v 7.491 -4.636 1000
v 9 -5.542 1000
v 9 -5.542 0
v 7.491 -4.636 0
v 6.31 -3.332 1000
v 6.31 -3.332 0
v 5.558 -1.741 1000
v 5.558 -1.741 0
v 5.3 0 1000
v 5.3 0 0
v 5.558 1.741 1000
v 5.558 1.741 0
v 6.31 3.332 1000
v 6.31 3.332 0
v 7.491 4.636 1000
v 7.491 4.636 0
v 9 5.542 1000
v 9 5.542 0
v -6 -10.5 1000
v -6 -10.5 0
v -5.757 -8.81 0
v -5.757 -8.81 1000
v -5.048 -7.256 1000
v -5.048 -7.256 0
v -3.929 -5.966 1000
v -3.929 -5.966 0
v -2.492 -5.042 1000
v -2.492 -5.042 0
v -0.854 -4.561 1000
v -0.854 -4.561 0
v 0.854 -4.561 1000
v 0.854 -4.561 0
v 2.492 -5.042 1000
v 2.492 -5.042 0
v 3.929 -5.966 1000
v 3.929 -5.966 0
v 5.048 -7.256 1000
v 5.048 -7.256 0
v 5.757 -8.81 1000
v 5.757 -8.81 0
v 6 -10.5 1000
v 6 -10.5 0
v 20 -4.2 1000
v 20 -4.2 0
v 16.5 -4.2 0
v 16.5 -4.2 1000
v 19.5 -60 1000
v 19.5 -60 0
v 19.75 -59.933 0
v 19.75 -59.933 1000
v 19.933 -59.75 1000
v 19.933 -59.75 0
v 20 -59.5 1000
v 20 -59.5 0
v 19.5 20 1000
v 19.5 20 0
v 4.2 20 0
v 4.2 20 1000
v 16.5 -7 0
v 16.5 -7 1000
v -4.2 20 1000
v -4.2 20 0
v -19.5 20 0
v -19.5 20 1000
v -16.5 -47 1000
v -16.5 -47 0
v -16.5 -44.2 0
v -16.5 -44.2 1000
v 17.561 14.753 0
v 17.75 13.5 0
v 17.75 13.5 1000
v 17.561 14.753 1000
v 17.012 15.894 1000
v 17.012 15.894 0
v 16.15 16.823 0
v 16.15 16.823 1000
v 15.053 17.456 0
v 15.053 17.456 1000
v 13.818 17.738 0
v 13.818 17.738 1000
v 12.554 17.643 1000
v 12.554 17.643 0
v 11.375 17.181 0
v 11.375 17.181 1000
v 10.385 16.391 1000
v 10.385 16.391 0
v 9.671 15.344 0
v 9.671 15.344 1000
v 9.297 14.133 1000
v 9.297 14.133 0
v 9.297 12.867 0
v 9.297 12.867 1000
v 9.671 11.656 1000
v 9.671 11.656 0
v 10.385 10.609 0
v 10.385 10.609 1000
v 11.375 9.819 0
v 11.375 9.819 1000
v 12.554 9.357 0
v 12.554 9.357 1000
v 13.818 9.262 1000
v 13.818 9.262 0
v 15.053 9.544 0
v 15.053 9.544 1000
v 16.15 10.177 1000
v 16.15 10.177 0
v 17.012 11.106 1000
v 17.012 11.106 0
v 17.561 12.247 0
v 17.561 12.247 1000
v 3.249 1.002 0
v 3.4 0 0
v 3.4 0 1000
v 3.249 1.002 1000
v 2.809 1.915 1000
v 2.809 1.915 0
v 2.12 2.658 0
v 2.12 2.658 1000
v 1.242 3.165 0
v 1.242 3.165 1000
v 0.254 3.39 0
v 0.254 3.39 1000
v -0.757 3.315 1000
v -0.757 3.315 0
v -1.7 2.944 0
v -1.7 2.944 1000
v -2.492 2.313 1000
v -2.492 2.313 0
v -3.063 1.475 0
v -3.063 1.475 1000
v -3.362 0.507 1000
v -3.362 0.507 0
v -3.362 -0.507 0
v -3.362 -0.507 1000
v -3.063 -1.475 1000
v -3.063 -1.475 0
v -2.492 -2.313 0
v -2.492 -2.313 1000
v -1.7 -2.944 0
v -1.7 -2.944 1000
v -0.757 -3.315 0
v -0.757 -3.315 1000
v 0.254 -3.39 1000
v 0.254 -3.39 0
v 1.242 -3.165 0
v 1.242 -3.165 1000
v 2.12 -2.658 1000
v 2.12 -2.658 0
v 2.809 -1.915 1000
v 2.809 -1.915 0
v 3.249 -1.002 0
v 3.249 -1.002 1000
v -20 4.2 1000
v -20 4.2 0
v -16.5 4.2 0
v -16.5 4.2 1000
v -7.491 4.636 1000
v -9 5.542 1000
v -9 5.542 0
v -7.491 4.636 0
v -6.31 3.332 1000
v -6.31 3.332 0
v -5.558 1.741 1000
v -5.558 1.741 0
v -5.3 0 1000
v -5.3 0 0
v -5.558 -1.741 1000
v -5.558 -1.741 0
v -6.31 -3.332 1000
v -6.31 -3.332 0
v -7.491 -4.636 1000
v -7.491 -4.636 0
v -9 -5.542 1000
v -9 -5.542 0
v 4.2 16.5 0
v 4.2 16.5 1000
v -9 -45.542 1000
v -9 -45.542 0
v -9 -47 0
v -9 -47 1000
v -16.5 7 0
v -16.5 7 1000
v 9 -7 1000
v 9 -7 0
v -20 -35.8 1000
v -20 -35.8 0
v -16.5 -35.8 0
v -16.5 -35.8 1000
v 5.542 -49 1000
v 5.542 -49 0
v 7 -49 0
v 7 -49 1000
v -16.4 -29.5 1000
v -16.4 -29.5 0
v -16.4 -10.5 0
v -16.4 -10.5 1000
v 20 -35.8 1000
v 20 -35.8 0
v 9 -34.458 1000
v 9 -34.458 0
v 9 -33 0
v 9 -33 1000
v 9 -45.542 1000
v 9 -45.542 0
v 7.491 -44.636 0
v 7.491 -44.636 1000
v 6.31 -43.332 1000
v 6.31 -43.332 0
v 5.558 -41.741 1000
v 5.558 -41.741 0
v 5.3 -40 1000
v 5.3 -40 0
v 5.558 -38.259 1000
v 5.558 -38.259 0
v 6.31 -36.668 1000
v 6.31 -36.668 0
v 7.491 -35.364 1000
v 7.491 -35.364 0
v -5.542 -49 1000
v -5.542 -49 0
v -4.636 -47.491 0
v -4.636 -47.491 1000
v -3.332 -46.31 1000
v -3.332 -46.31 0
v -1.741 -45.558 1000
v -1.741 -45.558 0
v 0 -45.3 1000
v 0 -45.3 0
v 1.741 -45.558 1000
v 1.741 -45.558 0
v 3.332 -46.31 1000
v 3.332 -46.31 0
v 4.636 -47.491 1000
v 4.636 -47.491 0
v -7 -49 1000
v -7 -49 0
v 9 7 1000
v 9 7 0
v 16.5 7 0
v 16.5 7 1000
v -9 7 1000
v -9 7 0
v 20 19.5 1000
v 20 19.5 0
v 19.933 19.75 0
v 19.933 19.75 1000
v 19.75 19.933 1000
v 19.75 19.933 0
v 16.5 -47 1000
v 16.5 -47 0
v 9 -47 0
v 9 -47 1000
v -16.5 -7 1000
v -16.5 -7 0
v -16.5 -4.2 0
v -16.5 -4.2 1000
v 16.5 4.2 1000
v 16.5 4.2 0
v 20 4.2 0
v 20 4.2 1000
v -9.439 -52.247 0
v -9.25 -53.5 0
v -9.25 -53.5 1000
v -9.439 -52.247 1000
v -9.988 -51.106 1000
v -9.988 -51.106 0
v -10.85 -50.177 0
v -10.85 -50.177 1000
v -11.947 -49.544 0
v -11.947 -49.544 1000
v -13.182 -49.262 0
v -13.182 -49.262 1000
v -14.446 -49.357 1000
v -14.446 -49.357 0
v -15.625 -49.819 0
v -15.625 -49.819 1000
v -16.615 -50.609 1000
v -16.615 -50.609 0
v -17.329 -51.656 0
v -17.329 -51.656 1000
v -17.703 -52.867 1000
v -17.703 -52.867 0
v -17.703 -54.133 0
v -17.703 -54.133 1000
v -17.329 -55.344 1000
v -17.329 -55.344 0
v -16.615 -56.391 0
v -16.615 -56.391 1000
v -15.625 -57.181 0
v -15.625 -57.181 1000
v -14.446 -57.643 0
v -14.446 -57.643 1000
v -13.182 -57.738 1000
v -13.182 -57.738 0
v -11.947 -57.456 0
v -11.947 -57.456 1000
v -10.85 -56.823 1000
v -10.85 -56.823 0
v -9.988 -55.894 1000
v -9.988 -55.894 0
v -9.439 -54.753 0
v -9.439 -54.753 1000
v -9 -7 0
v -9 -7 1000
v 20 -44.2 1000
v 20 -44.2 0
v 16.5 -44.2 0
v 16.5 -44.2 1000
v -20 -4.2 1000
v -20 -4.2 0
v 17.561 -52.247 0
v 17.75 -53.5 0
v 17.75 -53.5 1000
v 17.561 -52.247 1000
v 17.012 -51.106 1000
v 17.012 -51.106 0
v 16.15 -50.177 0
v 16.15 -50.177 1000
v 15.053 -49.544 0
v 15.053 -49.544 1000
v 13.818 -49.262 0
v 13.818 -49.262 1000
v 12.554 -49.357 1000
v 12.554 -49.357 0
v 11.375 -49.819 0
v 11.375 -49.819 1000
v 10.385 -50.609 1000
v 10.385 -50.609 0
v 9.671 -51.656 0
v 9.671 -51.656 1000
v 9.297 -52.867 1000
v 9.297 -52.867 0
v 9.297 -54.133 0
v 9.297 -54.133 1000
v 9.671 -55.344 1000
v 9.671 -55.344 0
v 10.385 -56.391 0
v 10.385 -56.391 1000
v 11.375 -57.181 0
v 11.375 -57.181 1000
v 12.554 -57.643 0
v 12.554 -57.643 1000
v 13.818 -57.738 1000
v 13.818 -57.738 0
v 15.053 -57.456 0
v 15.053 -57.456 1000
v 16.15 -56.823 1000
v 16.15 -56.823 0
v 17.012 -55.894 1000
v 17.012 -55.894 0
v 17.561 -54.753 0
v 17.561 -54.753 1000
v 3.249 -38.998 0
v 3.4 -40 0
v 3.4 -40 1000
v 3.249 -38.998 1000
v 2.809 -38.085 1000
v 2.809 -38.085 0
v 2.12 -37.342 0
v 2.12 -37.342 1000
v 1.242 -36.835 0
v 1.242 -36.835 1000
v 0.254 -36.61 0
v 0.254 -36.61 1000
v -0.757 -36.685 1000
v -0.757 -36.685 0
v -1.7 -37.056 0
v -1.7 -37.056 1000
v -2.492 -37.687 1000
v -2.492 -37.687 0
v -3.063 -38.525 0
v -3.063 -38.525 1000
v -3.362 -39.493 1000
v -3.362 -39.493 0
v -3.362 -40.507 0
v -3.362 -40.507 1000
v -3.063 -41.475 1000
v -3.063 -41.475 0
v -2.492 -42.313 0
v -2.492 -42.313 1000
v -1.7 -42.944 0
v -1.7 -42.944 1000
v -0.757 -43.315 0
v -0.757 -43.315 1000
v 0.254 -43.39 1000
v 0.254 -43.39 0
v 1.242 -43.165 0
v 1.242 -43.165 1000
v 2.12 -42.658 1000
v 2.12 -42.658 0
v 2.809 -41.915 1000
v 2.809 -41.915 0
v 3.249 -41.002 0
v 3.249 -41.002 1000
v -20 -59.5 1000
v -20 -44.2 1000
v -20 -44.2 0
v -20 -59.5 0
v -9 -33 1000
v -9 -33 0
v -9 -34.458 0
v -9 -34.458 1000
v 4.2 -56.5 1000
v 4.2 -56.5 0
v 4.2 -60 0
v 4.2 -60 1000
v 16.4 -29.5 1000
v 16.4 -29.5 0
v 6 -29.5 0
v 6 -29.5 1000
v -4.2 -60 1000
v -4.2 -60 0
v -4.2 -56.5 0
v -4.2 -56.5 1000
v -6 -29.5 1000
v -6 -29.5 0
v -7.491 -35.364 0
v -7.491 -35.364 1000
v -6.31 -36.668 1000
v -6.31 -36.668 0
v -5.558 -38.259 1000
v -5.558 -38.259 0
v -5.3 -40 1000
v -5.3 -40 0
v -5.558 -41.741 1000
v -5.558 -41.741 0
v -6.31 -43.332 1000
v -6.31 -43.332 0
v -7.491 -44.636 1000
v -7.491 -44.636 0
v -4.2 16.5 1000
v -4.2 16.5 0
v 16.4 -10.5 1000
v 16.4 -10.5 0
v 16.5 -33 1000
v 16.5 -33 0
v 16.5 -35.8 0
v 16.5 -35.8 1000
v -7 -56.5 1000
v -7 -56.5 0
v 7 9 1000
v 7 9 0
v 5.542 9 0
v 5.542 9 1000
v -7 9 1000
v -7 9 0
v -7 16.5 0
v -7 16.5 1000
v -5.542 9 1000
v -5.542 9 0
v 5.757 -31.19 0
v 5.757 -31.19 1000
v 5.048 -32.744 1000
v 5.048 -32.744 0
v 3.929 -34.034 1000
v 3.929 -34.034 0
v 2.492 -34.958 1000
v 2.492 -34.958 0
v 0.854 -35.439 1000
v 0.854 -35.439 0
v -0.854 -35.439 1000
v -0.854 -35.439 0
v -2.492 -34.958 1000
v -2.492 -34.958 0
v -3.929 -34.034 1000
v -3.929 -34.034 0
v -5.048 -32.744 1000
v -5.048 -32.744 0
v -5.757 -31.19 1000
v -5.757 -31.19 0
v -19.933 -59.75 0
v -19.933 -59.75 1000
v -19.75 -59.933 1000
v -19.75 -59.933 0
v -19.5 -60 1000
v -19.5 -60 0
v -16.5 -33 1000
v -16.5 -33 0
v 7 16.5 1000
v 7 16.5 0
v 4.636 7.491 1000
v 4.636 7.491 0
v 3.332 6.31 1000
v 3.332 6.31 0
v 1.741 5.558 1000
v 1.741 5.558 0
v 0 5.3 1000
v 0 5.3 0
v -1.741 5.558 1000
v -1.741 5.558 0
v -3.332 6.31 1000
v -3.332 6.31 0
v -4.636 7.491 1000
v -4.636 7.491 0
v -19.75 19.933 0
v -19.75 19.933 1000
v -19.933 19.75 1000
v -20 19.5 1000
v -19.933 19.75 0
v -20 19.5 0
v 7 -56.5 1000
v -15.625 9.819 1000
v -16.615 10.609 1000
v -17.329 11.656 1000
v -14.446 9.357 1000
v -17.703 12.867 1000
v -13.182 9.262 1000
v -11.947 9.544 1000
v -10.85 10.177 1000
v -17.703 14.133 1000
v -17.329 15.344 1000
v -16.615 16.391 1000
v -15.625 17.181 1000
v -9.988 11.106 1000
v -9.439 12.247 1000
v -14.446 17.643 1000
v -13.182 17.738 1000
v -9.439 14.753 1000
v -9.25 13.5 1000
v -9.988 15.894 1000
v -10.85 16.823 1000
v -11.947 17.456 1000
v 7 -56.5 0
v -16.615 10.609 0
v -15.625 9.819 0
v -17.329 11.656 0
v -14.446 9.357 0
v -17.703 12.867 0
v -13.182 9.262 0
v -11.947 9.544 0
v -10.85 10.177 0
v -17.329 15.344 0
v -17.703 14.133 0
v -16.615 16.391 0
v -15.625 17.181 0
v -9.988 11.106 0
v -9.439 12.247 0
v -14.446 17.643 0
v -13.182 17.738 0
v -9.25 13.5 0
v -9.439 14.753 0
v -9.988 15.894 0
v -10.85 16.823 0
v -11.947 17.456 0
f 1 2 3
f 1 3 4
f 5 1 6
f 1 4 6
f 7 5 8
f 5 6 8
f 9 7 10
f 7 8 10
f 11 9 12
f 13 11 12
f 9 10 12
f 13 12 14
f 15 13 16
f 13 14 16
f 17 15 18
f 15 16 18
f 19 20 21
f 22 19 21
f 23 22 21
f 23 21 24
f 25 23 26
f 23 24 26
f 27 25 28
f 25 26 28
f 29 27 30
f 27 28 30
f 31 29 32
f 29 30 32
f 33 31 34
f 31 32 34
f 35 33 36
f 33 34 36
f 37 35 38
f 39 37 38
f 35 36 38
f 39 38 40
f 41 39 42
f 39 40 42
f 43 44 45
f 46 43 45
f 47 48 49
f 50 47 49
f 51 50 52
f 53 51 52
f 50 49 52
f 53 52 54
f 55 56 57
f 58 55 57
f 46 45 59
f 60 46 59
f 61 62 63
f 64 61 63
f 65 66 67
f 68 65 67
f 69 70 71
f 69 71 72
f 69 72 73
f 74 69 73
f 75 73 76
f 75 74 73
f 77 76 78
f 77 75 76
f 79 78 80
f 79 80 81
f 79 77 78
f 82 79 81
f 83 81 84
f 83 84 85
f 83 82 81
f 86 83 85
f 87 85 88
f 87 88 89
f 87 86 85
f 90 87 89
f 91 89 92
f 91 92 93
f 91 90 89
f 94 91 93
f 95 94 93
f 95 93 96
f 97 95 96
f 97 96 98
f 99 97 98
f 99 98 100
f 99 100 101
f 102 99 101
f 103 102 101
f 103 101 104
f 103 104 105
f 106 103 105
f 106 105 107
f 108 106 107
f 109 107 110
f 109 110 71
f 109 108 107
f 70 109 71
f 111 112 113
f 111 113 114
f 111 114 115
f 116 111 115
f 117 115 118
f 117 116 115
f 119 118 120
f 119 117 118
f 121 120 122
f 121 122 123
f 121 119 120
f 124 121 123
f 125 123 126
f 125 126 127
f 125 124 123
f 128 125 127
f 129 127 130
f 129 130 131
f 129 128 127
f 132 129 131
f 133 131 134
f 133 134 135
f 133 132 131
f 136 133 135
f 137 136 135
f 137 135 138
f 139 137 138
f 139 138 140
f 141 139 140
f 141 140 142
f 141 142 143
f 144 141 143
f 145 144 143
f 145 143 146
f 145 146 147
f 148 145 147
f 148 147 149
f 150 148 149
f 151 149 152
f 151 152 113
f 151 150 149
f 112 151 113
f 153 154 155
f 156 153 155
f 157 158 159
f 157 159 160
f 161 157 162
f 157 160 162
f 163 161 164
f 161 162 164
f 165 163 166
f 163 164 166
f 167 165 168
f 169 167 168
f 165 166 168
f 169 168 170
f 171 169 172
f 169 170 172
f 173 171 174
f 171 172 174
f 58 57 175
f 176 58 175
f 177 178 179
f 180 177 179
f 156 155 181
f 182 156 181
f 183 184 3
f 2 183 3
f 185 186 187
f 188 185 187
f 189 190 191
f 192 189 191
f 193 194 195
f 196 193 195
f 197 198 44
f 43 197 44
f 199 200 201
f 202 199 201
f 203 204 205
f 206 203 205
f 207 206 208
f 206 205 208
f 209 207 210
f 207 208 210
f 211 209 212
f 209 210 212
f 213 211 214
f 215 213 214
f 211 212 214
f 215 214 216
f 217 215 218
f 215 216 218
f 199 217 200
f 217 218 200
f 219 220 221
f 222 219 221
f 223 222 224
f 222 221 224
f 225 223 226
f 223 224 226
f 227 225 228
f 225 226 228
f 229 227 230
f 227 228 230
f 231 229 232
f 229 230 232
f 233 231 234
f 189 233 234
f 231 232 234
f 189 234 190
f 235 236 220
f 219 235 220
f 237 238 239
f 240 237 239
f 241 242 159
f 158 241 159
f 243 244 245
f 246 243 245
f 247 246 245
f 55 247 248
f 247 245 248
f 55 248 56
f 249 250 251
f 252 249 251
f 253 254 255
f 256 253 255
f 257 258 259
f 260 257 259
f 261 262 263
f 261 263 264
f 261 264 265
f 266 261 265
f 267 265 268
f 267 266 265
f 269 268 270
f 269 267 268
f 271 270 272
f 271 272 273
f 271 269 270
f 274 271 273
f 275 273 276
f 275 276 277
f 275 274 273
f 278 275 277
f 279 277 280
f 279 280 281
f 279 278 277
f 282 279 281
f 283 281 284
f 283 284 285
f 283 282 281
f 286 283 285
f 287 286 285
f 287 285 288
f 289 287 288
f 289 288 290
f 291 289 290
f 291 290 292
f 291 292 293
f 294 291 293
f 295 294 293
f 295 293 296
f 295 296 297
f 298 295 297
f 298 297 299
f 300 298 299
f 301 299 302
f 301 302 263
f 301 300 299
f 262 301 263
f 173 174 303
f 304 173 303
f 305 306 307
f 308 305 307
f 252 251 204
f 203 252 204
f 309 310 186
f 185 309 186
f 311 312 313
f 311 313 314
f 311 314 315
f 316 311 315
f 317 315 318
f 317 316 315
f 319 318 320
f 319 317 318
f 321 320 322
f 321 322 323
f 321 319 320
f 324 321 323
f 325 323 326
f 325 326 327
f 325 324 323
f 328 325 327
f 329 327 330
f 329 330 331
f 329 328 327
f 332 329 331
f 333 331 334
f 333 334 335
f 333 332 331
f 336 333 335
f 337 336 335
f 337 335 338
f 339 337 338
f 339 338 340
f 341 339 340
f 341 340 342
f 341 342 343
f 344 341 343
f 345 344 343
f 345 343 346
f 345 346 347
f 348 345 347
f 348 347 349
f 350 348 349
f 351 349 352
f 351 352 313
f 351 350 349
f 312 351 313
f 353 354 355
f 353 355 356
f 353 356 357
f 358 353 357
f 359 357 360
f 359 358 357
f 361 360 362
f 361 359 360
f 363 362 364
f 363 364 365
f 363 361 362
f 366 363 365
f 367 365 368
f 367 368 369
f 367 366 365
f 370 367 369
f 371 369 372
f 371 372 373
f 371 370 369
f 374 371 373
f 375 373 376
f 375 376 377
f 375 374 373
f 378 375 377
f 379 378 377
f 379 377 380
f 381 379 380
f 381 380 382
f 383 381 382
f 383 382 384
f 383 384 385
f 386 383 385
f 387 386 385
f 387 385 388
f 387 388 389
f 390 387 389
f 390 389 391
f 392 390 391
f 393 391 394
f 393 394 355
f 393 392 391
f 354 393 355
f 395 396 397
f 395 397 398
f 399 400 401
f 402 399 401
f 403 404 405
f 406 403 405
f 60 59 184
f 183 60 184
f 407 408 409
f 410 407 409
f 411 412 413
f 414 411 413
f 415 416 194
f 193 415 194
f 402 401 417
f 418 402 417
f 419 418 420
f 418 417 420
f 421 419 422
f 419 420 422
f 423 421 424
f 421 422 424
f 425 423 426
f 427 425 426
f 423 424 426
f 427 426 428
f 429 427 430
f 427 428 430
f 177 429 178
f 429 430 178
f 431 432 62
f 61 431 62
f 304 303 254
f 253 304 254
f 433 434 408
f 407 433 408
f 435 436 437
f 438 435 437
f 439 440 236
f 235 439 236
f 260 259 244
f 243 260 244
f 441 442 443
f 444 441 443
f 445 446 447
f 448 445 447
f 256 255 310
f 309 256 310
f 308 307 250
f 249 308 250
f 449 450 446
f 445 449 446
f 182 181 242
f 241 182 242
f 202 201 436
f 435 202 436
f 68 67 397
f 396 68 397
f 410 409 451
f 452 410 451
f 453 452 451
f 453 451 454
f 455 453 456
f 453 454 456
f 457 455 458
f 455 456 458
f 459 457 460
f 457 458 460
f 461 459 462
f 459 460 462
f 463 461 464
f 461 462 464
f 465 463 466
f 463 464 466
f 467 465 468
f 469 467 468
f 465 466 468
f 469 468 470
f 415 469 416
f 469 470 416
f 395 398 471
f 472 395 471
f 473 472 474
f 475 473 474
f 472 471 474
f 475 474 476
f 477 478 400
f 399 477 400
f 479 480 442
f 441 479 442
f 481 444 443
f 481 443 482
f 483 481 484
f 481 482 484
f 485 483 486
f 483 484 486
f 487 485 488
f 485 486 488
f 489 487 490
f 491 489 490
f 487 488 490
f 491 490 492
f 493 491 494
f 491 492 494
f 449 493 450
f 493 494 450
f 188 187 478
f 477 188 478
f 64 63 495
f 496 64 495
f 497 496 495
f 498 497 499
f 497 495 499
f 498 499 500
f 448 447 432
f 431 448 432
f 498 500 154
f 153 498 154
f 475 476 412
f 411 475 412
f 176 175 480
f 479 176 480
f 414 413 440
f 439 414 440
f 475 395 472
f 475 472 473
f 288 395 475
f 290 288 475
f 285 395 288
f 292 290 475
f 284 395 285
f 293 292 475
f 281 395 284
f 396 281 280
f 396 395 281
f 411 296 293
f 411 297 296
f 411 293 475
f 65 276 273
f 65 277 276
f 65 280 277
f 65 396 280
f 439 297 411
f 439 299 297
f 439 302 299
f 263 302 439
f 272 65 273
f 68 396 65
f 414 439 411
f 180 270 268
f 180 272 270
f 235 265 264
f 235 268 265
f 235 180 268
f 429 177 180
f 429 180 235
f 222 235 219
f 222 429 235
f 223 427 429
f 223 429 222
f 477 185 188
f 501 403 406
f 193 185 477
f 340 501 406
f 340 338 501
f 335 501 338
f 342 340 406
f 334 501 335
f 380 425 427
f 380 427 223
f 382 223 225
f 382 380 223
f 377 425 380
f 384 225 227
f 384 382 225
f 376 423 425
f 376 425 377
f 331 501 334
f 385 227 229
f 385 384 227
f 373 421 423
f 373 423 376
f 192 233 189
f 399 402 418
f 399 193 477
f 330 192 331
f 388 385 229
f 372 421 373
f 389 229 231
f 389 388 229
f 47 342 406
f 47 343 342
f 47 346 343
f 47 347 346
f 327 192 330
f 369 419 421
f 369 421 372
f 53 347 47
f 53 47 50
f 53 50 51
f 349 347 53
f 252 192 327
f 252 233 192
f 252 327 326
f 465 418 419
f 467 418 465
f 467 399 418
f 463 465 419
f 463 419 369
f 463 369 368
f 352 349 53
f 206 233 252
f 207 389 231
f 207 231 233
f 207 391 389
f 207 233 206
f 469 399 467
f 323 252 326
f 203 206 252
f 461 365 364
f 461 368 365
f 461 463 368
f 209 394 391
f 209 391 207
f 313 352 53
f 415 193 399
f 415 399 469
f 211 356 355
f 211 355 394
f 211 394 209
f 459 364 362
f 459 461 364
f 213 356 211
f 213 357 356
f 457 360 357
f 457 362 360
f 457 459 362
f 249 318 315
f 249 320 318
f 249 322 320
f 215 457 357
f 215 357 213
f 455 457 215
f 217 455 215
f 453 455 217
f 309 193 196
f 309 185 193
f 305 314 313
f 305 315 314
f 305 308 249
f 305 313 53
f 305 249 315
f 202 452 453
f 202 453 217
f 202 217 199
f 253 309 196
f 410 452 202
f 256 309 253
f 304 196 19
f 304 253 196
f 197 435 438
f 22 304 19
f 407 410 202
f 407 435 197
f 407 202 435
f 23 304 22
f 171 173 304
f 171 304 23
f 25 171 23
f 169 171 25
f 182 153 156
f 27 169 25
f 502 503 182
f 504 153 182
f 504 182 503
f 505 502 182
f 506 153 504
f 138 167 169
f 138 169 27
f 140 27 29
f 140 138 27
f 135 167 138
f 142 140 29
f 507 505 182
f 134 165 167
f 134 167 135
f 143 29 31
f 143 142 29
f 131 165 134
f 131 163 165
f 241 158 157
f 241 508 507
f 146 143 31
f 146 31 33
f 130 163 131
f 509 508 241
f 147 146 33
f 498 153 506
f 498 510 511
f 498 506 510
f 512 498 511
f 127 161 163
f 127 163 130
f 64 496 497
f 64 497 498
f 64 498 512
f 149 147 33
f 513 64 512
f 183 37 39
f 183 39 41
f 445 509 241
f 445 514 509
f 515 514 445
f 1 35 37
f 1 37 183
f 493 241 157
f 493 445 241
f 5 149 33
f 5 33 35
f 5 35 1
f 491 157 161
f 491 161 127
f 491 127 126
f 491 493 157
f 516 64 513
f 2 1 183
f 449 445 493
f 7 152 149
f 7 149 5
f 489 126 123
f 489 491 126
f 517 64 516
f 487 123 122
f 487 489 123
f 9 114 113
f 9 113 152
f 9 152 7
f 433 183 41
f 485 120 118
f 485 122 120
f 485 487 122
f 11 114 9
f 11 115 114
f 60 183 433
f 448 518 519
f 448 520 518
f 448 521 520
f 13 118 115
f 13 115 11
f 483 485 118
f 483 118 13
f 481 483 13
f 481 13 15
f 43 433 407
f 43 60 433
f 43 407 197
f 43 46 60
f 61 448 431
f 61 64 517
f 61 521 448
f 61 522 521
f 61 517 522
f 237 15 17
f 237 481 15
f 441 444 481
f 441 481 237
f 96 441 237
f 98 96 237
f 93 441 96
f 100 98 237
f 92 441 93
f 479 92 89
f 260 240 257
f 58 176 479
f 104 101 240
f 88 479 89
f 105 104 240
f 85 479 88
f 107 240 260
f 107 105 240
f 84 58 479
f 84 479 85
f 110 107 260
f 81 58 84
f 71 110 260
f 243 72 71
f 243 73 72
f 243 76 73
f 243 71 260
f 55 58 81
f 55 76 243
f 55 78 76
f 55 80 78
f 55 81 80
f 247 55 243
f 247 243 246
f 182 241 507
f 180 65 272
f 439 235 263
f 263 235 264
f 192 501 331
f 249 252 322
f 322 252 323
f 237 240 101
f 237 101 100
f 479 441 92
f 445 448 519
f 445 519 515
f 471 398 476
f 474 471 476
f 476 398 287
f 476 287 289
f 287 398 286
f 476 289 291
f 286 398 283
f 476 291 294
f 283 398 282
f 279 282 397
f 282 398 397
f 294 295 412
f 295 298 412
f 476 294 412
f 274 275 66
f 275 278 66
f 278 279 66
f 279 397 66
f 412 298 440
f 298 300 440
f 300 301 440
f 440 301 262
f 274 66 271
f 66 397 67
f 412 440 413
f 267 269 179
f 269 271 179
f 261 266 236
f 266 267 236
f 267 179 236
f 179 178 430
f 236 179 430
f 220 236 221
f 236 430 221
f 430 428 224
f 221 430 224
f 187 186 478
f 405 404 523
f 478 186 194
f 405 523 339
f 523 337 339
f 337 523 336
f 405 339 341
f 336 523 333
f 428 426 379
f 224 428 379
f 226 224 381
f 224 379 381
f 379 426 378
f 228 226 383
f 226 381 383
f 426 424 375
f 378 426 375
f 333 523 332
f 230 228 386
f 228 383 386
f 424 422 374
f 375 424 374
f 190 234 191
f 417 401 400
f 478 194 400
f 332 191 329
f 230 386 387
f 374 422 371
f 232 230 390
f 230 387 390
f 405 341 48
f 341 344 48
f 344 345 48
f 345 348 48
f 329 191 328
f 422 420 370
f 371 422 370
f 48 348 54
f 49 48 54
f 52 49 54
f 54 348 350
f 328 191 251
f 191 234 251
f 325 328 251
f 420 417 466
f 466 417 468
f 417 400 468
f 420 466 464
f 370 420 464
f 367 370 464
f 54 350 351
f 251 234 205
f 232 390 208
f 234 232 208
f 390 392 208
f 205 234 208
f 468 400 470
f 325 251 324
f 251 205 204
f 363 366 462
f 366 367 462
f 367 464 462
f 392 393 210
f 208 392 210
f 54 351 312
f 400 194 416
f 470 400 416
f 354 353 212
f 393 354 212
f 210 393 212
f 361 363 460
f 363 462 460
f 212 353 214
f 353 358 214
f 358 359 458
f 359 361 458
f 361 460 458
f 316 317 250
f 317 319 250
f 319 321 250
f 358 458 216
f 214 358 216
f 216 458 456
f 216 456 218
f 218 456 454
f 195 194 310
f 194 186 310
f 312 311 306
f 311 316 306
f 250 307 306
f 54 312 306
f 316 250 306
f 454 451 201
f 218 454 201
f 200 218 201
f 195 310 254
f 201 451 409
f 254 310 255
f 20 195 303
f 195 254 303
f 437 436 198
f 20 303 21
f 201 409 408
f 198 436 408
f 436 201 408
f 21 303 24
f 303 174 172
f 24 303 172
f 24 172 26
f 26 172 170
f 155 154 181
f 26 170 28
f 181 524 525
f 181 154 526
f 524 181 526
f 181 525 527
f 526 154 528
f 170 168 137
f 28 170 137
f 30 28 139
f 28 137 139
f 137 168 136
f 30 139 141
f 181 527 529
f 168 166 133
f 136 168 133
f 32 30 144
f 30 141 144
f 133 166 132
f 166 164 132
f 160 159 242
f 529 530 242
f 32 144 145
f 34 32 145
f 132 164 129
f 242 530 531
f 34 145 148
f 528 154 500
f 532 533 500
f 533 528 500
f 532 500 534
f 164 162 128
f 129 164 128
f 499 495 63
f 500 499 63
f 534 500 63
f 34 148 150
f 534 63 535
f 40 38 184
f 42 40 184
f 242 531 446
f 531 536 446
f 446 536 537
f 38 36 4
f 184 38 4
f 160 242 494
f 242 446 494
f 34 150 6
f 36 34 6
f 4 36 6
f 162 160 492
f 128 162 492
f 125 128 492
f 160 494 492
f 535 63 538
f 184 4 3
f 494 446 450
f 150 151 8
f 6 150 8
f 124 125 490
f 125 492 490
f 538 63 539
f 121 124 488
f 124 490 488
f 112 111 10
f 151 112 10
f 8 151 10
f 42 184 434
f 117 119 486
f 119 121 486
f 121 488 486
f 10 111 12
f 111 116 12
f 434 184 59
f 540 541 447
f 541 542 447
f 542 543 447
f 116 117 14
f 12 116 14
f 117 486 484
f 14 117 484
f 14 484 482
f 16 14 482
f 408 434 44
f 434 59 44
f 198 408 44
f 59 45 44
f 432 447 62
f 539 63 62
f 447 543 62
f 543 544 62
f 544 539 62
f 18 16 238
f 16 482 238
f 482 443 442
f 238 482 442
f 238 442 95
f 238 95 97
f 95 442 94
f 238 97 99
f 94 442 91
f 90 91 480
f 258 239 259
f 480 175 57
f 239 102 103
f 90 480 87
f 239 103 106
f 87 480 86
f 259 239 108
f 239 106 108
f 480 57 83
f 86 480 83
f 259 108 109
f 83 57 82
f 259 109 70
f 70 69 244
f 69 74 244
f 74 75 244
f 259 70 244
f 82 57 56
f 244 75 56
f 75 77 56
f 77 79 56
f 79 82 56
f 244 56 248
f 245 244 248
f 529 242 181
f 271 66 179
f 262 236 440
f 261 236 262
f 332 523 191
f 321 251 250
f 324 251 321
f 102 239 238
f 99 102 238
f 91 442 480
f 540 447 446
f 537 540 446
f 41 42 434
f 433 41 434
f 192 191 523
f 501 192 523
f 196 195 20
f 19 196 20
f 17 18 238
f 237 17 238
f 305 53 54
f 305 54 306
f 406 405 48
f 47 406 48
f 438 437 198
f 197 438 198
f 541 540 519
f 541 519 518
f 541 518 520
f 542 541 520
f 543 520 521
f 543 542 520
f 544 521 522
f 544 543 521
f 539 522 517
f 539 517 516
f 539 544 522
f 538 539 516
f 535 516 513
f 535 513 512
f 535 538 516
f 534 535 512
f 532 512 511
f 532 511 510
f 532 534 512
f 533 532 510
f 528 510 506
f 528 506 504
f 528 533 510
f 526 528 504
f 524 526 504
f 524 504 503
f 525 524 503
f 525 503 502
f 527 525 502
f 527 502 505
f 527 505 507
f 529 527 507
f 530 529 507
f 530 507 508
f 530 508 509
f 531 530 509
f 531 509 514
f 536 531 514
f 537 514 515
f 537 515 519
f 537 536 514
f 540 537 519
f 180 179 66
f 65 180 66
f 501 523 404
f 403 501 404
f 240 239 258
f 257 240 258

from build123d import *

# Parameters (mm, degrees)
SKETCH_1_R      = 4.25
SKETCH_1_R_2    = 3.4
EXTRUDE_1_DEPTH = 1000


with BuildPart() as part:
    # Эскиз1 → Бобышка-Вытянуть1 (new body)
    with BuildSketch(Plane.XY):
        with BuildLine():
            Line((-20, 19.5), (-20, 7))
            Line((-20, 7), (-20, 4.2))
            Line((-20, 4.2), (-16.5, 4.2))
            Line((-16.5, 4.2), (-16.5, 7))
            Line((-16.5, 7), (-9, 7))
            Line((-9, 7), (-9, 5.541660401))
            ThreePointArc((-9, 5.541660401), (-5.3, 0), (-9, -5.541660401))
            Line((-9, -5.541660401), (-9, -7))
            Line((-9, -7), (-16.5, -7))
            Line((-16.5, -7), (-16.5, -4.2))
            Line((-16.5, -4.2), (-20, -4.2))
            Line((-20, -4.2), (-20, -7))
            Line((-20, -7), (-20, -33))
            Line((-20, -33), (-20, -35.8))
            Line((-20, -35.8), (-16.5, -35.8))
            Line((-16.5, -35.8), (-16.5, -33))
            Line((-16.5, -33), (-9, -33))
            Line((-9, -33), (-9, -34.458339599))
            ThreePointArc((-9, -34.458339599), (-5.3, -40), (-9, -45.541660401))
            Line((-9, -45.541660401), (-9, -47))
            Line((-9, -47), (-16.5, -47))
            Line((-16.5, -47), (-16.5, -44.2))
            Line((-16.5, -44.2), (-20, -44.2))
            Line((-20, -44.2), (-20, -47))
            Line((-20, -47), (-20, -59.5))
            ThreePointArc((-20, -59.5), (-19.853553391, -59.853553391), (-19.5, -60))
            Line((-19.5, -60), (-7, -60))
            Line((-7, -60), (-4.2, -60))
            Line((-4.2, -60), (-4.2, -56.5))
            Line((-4.2, -56.5), (-7, -56.5))
            Line((-7, -56.5), (-7, -49))
            Line((-7, -49), (-5.541660401, -49))
            ThreePointArc((-5.541660401, -49), (0, -45.3), (5.541660401, -49))
            Line((5.541660401, -49), (7, -49))
            Line((7, -49), (7, -56.5))
            Line((7, -56.5), (4.2, -56.5))
            Line((4.2, -56.5), (4.2, -60))
            Line((4.2, -60), (7, -60))
            Line((7, -60), (19.5, -60))
            ThreePointArc((19.5, -60), (19.853553391, -59.853553391), (20, -59.5))
            Line((20, -59.5), (20, -47))
            Line((20, -47), (20, -44.2))
            Line((20, -44.2), (16.5, -44.2))
            Line((16.5, -44.2), (16.5, -47))
            Line((16.5, -47), (9, -47))
            Line((9, -47), (9, -45.541660401))
            ThreePointArc((9, -45.541660401), (5.3, -40), (9, -34.458339599))
            Line((9, -34.458339599), (9, -33))
            Line((9, -33), (16.5, -33))
            Line((16.5, -33), (16.5, -35.8))
            Line((16.5, -35.8), (20, -35.8))
            Line((20, -35.8), (20, -33))
            Line((20, -33), (20, -7))
            Line((20, -7), (20, -4.2))
            Line((20, -4.2), (16.5, -4.2))
            Line((16.5, -4.2), (16.5, -7))
            Line((16.5, -7), (9, -7))
            Line((9, -7), (9, -5.541660401))
            ThreePointArc((9, -5.541660401), (5.3, 0), (9, 5.541660401))
            Line((9, 5.541660401), (9, 7))
            Line((9, 7), (16.5, 7))
            Line((16.5, 7), (16.5, 4.2))
            Line((16.5, 4.2), (20, 4.2))
            Line((20, 4.2), (20, 7))
            Line((20, 7), (20, 19.5))
            ThreePointArc((20, 19.5), (19.853553391, 19.853553391), (19.5, 20))
            Line((19.5, 20), (7, 20))
            Line((7, 20), (4.2, 20))
            Line((4.2, 20), (4.2, 16.5))
            Line((4.2, 16.5), (7, 16.5))
            Line((7, 16.5), (7, 9))
            Line((7, 9), (5.541660401, 9))
            ThreePointArc((5.541660401, 9), (0, 5.3), (-5.541660401, 9))
            Line((-5.541660401, 9), (-7, 9))
            Line((-7, 9), (-7, 16.5))
            Line((-7, 16.5), (-4.2, 16.5))
            Line((-4.2, 16.5), (-4.2, 20))
            Line((-4.2, 20), (-7, 20))
            Line((-7, 20), (-19.5, 20))
            ThreePointArc((-19.5, 20), (-19.853553391, 19.853553391), (-20, 19.5))
        make_face()
        with Locations((-13.5, -53.5)):
            Circle(SKETCH_1_R, mode=Mode.SUBTRACT)
        with Locations((13.5, -53.5)):
            Circle(SKETCH_1_R, mode=Mode.SUBTRACT)
        with Locations((0, -40)):
            Circle(SKETCH_1_R_2, mode=Mode.SUBTRACT)
        with Locations((-13.5, 13.5)):
            Circle(SKETCH_1_R, mode=Mode.SUBTRACT)
        with BuildLine():
            Line((16.4, -10.5), (16.4, -29.5))
            Line((16.4, -29.5), (6, -29.5))
            ThreePointArc((6, -29.5), (0, -35.5), (-6, -29.5))
            Line((-6, -29.5), (-16.4, -29.5))
            Line((-16.4, -29.5), (-16.4, -10.5))
            Line((-16.4, -10.5), (-6, -10.5))
            ThreePointArc((-6, -10.5), (0, -4.5), (6, -10.5))
            Line((6, -10.5), (16.4, -10.5))
        make_face(mode=Mode.SUBTRACT)
        Circle(SKETCH_1_R_2, mode=Mode.SUBTRACT)
        with Locations((13.5, 13.5)):
            Circle(SKETCH_1_R, mode=Mode.SUBTRACT)
    extrude(amount=EXTRUDE_1_DEPTH)


solid = part.part
